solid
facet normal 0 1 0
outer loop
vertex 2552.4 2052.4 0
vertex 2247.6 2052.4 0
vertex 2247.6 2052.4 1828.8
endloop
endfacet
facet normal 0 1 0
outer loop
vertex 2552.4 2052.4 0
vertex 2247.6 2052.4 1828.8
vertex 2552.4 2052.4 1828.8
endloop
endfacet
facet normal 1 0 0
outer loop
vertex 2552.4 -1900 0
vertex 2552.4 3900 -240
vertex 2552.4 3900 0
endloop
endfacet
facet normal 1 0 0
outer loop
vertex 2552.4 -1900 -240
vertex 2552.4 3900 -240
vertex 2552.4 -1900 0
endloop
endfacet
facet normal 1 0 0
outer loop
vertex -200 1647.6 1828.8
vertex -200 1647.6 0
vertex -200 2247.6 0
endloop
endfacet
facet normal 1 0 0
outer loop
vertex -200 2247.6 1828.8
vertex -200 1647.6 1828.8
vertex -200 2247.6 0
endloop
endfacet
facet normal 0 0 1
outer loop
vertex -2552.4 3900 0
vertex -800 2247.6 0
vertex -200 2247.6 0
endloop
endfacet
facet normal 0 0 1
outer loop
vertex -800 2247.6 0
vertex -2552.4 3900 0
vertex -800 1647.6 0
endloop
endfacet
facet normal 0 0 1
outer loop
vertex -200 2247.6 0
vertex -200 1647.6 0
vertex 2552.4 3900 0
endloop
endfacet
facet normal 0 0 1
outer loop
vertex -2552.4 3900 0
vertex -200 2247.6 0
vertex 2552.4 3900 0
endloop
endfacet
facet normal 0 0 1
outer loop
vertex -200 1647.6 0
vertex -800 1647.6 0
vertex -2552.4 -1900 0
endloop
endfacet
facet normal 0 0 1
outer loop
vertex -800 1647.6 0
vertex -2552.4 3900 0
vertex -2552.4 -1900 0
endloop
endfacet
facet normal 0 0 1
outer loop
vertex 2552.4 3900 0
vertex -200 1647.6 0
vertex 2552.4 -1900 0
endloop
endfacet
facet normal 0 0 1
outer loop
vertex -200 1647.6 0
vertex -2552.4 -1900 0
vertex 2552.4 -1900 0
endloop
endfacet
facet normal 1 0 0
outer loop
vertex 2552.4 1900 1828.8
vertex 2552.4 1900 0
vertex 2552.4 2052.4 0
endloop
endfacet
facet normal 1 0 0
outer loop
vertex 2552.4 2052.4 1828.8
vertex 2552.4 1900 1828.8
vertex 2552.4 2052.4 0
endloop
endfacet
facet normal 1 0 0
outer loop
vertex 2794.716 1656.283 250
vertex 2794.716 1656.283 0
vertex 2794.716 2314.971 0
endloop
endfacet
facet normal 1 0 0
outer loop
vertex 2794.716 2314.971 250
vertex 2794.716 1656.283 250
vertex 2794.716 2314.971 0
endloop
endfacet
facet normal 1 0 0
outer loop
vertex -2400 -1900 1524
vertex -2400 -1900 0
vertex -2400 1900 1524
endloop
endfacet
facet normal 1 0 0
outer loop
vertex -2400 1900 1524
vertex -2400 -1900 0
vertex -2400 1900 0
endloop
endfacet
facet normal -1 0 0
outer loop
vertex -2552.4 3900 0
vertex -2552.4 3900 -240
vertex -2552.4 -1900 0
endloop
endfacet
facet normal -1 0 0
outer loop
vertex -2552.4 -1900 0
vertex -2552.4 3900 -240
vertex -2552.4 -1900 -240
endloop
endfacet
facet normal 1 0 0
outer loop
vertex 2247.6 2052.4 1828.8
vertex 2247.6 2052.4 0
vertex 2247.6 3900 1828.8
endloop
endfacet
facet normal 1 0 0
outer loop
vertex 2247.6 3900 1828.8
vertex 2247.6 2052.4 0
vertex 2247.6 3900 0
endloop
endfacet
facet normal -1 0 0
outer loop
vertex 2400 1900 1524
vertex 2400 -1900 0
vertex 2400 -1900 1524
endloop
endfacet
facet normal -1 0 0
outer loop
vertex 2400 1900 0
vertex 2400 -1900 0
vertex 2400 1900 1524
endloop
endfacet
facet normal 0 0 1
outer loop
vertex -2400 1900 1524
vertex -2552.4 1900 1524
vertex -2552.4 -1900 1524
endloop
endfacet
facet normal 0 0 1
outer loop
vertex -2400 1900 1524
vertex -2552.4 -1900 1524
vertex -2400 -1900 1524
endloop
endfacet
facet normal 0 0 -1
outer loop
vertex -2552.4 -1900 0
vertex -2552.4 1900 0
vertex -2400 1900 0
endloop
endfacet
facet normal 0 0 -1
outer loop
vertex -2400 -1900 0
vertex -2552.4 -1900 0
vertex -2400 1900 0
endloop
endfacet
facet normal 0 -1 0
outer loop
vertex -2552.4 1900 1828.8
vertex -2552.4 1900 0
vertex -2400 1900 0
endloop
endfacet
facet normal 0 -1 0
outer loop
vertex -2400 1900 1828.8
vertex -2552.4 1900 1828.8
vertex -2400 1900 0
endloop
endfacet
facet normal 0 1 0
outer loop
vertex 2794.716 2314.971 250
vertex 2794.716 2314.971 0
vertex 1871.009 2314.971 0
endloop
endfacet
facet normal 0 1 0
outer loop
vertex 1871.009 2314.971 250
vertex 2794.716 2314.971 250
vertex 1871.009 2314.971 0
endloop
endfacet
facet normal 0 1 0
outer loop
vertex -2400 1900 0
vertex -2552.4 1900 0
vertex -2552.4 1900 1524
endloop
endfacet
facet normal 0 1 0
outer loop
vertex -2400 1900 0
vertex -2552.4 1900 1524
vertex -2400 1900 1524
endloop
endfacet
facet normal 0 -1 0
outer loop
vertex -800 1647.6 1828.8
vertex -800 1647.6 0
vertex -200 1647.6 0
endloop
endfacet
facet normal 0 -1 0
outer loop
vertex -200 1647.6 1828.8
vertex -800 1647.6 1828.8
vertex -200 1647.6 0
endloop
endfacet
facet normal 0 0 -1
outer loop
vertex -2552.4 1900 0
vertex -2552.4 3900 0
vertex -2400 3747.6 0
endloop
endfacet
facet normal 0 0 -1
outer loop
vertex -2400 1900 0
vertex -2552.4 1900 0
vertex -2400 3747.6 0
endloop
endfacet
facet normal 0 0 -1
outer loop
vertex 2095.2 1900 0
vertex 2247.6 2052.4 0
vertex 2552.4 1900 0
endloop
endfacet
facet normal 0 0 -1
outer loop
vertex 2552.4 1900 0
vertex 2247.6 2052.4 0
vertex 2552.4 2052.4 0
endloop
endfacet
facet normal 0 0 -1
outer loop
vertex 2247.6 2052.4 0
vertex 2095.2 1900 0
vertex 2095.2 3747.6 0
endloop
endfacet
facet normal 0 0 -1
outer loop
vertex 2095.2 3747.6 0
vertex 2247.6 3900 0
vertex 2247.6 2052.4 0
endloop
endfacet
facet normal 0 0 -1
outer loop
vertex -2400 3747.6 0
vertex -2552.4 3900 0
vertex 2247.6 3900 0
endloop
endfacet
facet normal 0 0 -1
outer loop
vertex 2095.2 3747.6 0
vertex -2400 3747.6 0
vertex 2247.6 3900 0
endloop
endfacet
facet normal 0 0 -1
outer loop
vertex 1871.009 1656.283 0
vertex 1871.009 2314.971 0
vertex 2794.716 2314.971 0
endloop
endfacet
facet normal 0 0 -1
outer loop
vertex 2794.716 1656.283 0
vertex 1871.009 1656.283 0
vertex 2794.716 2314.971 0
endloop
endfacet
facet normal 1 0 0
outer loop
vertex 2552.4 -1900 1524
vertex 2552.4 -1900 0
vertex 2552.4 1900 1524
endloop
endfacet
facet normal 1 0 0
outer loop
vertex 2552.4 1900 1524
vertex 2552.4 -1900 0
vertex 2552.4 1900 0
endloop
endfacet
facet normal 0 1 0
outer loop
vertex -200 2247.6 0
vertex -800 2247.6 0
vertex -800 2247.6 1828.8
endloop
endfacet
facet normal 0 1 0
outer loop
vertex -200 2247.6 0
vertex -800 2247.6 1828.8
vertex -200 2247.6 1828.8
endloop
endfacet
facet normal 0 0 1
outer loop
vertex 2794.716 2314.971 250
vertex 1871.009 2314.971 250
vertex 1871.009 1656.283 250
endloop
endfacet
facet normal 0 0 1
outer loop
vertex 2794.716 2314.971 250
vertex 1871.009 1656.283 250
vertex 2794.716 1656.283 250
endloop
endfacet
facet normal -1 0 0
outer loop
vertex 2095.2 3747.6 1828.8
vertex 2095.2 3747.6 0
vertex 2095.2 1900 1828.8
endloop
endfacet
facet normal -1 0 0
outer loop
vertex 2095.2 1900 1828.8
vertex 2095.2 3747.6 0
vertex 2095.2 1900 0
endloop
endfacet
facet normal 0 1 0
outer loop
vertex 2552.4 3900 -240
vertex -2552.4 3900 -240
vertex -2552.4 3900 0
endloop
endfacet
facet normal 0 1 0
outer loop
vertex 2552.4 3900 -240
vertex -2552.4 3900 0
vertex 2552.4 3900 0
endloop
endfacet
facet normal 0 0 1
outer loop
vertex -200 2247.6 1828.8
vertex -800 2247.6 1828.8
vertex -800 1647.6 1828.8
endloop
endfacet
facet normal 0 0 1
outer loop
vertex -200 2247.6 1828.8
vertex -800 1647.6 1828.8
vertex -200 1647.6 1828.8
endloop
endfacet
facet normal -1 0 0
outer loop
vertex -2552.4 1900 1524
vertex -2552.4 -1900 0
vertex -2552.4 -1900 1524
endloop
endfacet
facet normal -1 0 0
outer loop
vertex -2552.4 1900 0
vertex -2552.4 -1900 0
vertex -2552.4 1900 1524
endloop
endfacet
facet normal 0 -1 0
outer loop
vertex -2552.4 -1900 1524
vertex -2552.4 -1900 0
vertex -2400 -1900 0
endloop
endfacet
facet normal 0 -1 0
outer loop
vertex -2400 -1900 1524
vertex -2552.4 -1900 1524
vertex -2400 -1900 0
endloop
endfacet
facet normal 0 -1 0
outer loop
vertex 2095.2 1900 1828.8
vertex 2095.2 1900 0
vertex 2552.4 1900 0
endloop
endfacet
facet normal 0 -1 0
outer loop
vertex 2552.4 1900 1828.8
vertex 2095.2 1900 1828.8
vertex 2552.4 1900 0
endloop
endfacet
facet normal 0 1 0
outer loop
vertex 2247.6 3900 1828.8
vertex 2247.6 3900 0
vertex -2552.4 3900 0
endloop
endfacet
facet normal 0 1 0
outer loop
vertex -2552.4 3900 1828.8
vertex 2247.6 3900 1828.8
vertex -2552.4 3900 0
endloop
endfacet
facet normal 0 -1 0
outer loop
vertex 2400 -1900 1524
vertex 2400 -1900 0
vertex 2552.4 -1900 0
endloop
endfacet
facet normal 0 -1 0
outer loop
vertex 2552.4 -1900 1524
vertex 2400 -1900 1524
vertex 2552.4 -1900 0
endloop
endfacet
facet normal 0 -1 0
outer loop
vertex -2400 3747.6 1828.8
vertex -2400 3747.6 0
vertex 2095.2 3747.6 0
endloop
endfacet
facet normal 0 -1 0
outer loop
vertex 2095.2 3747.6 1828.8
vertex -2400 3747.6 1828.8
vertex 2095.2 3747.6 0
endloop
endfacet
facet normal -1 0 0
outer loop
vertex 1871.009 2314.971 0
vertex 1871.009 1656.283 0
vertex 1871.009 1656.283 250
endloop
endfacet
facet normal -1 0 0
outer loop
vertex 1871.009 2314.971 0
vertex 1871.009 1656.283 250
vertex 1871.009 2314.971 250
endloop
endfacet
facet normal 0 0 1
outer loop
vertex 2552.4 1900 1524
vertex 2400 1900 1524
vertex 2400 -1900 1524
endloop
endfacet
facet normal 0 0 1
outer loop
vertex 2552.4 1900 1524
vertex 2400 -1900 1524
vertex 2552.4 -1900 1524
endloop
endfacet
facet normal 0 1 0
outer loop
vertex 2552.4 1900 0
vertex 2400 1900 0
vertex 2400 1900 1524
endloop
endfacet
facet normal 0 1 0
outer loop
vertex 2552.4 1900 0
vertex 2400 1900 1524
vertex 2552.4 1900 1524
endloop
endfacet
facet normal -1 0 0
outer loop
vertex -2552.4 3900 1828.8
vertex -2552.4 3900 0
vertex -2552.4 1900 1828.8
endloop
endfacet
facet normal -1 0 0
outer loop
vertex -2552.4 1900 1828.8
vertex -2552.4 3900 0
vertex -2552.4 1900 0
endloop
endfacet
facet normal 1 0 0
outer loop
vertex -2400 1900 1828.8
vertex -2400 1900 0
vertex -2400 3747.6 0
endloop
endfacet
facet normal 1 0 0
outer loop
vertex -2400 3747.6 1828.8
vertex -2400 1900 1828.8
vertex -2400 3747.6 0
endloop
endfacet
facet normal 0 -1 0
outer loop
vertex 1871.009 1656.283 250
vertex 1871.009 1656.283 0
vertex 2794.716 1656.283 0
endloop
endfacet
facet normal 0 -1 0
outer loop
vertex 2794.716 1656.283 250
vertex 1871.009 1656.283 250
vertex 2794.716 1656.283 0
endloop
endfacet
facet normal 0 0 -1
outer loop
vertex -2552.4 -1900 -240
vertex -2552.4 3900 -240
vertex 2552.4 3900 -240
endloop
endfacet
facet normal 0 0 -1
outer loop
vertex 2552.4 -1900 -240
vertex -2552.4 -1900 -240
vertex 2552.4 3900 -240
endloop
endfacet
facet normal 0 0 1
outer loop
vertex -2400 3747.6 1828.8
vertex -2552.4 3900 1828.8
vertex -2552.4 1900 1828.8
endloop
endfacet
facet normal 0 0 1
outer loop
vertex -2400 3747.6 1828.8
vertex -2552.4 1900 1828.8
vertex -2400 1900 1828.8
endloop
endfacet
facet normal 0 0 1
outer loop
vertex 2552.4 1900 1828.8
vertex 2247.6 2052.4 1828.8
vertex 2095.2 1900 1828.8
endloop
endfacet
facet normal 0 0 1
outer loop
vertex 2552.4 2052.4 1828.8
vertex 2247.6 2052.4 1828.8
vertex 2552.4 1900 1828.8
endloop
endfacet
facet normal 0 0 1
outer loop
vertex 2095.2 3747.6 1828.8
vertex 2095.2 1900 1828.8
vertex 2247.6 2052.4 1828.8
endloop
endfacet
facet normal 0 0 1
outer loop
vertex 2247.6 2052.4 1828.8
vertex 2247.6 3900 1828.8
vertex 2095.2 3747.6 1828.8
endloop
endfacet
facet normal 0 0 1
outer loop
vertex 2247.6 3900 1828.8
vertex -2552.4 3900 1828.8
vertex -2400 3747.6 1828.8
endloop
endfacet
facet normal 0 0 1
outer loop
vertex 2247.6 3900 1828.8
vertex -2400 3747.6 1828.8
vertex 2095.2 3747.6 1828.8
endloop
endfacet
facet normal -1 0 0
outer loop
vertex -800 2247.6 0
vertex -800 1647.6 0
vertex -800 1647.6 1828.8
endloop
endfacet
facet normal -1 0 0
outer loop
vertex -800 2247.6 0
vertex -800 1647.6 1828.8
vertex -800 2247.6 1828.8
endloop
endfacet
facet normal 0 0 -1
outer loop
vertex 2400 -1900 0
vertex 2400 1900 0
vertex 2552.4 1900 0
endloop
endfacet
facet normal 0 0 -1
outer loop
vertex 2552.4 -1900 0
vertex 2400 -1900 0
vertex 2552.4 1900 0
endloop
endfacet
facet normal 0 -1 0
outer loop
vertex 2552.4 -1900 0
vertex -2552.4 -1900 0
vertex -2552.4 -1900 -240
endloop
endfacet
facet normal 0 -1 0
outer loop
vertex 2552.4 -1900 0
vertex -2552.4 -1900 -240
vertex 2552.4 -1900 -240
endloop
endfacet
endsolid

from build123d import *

# Parameters (mm, degrees)
F0_W      = 152.4
F0_H      = 3800
F1_DEPTH  = 1524
F2_W      = 5104.8
F2_H      = 3800
F3_DEPTH  = 240
F4_W      = 5104.8
F4_H      = 2000
F5_DEPTH  = 240
F6_W      = 242.3163581848
F6_H      = 658.6881875992
F6_W_2    = 681.3907693863
F7_DEPTH  = 250
F8_W      = 4495.2
F8_H      = 152.4
F8_W_2    = 304.8
F9_DEPTH  = 1828.8
F10_W     = 600
F10_H     = 600
F11_DEPTH = 1828.8


with BuildPart() as f1:
    # F0 (on Top) → F1 (new body)
    with BuildSketch(Plane.XY):
        with Locations((-2476.2, 0)):
            Rectangle(F0_W, F0_H)
    extrude(amount=F1_DEPTH)


with BuildPart() as f1b:
    # F0 (on Top) → F1, piece 2 (new body)
    with BuildSketch(Plane.XY):
        with Locations((2476.2, 0)):
            Rectangle(F0_W, F0_H)
    extrude(amount=F1_DEPTH)


with BuildPart() as f3:
    # F2 (on face) → F3 (new body)
    with BuildSketch(Plane(origin=(0, 0, 0), x_dir=(1, 0, 0), z_dir=(0, 0, -1))):
        Rectangle(F2_W, F2_H)
    extrude(amount=F3_DEPTH)

    # F4 (on face) → F5 (join, through all)
    with BuildSketch(Plane(origin=(0, 0, -240), x_dir=(1, 0, 0), z_dir=(0, 0, -1))):
        with Locations((0, -2900)):
            Rectangle(F4_W, F4_H)
    extrude(amount=-F5_DEPTH)

    # F10 (on face) → F11 (join, through all)
    with BuildSketch(Plane.XY):
        with Locations((-500, 1947.6)):
            Rectangle(F10_W, F10_H)
    extrude(amount=F11_DEPTH)


with BuildPart() as f7:
    # F6 (on face) → F7 (new body)
    with BuildSketch(Plane.XY):
        with Locations((2673.5581790924, 1985.6271147728)):
            Rectangle(F6_W, F6_H)
        with Locations((2211.7046153069, 1985.6271147728)):
            Rectangle(F6_W_2, F6_H)
    extrude(amount=F7_DEPTH)


with BuildPart() as f9:
    # F8 (on face) → F9 (new body)
    with BuildSketch(Plane.XY):
        Polygon((-2552.4, 3900), (-2552.4, 1900), (-2400, 1900), (-2400, 3747.6), (-2400, 3900), align=None)
        with Locations((-152.4, 3823.8)):
            Rectangle(F8_W, F8_H)
        Polygon((2095.2, 3900), (2095.2, 3747.6), (2095.2, 1900), (2247.6, 1900), (2247.6, 2052.4), (2247.6, 3900), align=None)
        with Locations((2400, 1976.2)):
            Rectangle(F8_W_2, F8_H)
    extrude(amount=F9_DEPTH)


solid = Compound([f1.part, f1b.part, f3.part, f7.part, f9.part])
